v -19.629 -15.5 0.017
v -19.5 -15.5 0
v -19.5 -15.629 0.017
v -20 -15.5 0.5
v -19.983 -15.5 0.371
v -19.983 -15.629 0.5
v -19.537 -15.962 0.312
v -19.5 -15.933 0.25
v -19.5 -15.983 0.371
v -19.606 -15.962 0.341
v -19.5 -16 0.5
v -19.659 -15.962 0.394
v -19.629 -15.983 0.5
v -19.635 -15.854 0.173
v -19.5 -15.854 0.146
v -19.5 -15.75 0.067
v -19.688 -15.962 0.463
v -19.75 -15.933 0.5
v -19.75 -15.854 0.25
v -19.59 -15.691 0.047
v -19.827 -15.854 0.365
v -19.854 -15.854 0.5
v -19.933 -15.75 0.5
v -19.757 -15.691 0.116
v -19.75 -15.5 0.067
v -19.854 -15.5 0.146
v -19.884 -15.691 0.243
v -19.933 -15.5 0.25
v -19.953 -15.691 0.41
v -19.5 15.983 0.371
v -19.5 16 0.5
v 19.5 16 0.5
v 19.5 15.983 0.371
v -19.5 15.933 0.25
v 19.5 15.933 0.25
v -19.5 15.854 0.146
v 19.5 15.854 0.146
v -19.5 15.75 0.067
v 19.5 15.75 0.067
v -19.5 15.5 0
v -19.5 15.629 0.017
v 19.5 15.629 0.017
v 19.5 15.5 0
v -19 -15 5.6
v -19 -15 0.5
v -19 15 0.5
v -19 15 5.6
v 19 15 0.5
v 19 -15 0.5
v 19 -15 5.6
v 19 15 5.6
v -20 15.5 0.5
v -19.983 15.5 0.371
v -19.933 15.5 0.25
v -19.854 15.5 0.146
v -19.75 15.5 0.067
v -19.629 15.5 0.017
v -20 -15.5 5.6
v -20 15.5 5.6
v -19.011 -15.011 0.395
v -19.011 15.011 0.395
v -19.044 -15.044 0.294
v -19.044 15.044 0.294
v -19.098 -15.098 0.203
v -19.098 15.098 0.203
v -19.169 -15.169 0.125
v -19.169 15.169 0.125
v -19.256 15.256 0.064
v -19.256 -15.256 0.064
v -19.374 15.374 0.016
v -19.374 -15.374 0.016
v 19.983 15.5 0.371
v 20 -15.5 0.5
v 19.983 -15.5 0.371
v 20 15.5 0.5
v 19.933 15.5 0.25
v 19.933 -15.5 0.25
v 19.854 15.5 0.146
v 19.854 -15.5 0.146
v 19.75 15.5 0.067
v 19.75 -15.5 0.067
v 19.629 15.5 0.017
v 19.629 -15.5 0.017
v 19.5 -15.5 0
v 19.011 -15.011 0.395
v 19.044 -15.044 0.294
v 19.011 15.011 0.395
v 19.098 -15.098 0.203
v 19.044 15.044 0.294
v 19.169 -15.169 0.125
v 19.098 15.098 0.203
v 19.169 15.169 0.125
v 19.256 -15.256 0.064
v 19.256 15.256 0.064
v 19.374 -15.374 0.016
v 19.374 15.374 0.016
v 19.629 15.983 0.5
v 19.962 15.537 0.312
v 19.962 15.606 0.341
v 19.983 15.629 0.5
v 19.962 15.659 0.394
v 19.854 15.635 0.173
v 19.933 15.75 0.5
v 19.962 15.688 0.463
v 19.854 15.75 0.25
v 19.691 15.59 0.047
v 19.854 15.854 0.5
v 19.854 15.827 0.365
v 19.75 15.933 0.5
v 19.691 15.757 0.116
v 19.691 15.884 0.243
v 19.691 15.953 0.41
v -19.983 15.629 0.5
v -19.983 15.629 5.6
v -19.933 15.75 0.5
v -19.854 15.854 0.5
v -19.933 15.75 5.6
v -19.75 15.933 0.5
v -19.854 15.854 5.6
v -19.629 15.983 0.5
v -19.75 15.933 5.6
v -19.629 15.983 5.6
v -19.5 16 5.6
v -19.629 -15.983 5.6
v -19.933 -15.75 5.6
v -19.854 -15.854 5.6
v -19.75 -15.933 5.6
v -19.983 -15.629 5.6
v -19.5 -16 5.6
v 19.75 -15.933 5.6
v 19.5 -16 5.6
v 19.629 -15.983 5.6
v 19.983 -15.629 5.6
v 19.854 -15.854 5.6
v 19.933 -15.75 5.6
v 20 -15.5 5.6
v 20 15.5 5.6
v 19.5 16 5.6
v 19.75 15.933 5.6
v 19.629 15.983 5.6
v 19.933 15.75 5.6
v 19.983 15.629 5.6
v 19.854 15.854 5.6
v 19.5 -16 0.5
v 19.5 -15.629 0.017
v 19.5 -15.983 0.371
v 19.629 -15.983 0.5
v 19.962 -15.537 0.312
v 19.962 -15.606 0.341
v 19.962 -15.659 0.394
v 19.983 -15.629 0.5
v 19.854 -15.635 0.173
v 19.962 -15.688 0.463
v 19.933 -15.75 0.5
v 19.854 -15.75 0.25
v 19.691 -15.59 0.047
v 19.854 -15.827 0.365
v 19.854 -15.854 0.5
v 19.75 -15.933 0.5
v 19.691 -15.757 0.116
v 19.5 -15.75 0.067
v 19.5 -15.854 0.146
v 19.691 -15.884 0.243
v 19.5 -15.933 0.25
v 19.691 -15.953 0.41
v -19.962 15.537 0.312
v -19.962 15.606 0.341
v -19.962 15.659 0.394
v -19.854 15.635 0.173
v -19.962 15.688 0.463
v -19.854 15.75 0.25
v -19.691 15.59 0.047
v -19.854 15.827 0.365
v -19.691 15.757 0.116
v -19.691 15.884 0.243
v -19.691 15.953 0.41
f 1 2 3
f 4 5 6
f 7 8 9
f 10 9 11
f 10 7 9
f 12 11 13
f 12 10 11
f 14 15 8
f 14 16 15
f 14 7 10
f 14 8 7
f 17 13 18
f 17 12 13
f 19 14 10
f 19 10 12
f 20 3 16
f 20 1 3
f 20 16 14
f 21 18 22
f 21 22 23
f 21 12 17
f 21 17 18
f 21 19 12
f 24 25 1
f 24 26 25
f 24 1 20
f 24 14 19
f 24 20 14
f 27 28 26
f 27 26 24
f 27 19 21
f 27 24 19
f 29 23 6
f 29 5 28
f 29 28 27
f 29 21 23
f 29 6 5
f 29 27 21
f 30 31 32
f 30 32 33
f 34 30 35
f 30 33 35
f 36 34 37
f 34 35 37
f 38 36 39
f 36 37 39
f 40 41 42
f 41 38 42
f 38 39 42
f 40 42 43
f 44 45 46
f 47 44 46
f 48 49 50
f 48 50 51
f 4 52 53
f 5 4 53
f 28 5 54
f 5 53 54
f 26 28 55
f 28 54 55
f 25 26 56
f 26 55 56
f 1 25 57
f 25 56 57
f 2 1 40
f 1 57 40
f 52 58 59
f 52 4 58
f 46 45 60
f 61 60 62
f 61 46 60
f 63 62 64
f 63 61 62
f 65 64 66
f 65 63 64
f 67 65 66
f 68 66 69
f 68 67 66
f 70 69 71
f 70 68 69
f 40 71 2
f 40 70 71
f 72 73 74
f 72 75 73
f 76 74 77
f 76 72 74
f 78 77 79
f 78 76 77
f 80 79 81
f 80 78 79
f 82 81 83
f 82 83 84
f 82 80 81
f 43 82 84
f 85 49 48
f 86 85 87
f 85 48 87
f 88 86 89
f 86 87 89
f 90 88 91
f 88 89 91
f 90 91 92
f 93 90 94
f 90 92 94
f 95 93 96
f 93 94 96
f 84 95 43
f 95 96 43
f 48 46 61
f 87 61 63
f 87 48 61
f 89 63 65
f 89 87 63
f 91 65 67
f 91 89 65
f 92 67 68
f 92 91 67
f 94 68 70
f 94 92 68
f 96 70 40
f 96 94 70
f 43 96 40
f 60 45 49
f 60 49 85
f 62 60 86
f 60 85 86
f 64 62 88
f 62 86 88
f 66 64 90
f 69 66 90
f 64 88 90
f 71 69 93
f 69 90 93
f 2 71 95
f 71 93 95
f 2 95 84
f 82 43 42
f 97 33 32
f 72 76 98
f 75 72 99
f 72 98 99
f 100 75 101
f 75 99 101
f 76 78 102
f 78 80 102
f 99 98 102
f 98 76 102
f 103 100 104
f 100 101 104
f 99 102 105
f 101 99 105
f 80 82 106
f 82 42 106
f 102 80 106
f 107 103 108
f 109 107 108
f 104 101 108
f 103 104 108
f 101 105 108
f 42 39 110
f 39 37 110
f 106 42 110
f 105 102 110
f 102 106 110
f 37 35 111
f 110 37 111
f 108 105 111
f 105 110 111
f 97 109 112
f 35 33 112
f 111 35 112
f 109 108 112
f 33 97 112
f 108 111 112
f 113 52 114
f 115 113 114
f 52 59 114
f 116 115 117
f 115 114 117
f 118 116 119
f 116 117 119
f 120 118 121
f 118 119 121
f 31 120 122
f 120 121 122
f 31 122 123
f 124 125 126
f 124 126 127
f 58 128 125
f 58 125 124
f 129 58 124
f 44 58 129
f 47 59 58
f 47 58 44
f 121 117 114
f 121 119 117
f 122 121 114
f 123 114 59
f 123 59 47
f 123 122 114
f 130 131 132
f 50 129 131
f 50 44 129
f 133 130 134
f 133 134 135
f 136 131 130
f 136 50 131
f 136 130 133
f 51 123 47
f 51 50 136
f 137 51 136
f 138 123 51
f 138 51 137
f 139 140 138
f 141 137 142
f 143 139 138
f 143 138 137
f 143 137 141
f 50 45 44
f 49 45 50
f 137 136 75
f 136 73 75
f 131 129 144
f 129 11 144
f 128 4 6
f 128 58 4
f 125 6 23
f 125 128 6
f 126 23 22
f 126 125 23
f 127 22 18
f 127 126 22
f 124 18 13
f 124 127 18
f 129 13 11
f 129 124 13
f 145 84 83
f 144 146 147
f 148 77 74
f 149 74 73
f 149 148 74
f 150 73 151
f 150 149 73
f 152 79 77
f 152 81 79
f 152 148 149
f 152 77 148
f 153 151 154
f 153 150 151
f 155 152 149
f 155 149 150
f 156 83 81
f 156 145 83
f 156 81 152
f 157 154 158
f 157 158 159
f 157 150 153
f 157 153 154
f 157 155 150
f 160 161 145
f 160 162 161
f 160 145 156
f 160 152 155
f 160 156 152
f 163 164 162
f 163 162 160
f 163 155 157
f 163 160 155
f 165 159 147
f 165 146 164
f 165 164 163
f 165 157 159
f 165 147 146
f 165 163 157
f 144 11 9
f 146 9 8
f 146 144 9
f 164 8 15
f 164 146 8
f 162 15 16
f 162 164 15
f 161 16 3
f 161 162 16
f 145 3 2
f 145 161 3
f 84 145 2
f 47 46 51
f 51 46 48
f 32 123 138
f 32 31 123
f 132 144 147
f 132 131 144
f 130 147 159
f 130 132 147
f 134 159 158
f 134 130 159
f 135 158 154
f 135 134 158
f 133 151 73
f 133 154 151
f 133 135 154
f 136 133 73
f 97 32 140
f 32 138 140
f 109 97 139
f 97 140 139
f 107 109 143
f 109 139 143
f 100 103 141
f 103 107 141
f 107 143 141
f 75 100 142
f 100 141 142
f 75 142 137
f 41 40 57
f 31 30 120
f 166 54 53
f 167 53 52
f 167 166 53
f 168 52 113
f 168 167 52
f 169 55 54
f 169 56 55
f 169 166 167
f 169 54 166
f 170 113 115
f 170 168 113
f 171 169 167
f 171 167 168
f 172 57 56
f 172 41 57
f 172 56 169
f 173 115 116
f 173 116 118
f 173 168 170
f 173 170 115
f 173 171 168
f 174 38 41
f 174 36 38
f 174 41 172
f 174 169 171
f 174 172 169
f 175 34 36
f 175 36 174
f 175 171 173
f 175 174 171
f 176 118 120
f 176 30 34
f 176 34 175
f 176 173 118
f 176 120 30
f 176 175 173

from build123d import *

# Parameters (mm, degrees)
F0_W     = 40
F0_H     = 32
F0_W_2   = 38
F0_H_2   = 30
F1_DEPTH = 5.6
F2_R     = 0.49999


# Not quite as in the source:
# - a fillet or chamfer is up to 0.001 mm smaller than in the source, because OpenCascade refuses the exact size


with BuildPart() as f1:
    # F0 (on Top) → F1 (new body)
    with BuildSketch(Plane.XY):
        Rectangle(F0_W, F0_H)
        Rectangle(F0_W_2, F0_H_2, mode=Mode.SUBTRACT)
    extrude(amount=F1_DEPTH)

    # F2 (radius 0.5 in the source; OpenCascade refuses exactly that, so slightly less here)
    f2_edges = [f1.edges().sort_by_distance(p)[0] for p in [
        (0, 16, 0),
        (-20, 0, 0),
        (0, -16, 0),
        (20, 0, 0),
        (0, 15, 0),
        (19, 0, 0),
        (0, -15, 0),
        (-19, 0, 0),
        (-20, -16, 2.8),
        (20, -16, 2.8),
        (-20, 16, 2.8),
        (20, 16, 2.8),
    ]]
    fillet(f2_edges, radius=F2_R)


solid = f1.part
